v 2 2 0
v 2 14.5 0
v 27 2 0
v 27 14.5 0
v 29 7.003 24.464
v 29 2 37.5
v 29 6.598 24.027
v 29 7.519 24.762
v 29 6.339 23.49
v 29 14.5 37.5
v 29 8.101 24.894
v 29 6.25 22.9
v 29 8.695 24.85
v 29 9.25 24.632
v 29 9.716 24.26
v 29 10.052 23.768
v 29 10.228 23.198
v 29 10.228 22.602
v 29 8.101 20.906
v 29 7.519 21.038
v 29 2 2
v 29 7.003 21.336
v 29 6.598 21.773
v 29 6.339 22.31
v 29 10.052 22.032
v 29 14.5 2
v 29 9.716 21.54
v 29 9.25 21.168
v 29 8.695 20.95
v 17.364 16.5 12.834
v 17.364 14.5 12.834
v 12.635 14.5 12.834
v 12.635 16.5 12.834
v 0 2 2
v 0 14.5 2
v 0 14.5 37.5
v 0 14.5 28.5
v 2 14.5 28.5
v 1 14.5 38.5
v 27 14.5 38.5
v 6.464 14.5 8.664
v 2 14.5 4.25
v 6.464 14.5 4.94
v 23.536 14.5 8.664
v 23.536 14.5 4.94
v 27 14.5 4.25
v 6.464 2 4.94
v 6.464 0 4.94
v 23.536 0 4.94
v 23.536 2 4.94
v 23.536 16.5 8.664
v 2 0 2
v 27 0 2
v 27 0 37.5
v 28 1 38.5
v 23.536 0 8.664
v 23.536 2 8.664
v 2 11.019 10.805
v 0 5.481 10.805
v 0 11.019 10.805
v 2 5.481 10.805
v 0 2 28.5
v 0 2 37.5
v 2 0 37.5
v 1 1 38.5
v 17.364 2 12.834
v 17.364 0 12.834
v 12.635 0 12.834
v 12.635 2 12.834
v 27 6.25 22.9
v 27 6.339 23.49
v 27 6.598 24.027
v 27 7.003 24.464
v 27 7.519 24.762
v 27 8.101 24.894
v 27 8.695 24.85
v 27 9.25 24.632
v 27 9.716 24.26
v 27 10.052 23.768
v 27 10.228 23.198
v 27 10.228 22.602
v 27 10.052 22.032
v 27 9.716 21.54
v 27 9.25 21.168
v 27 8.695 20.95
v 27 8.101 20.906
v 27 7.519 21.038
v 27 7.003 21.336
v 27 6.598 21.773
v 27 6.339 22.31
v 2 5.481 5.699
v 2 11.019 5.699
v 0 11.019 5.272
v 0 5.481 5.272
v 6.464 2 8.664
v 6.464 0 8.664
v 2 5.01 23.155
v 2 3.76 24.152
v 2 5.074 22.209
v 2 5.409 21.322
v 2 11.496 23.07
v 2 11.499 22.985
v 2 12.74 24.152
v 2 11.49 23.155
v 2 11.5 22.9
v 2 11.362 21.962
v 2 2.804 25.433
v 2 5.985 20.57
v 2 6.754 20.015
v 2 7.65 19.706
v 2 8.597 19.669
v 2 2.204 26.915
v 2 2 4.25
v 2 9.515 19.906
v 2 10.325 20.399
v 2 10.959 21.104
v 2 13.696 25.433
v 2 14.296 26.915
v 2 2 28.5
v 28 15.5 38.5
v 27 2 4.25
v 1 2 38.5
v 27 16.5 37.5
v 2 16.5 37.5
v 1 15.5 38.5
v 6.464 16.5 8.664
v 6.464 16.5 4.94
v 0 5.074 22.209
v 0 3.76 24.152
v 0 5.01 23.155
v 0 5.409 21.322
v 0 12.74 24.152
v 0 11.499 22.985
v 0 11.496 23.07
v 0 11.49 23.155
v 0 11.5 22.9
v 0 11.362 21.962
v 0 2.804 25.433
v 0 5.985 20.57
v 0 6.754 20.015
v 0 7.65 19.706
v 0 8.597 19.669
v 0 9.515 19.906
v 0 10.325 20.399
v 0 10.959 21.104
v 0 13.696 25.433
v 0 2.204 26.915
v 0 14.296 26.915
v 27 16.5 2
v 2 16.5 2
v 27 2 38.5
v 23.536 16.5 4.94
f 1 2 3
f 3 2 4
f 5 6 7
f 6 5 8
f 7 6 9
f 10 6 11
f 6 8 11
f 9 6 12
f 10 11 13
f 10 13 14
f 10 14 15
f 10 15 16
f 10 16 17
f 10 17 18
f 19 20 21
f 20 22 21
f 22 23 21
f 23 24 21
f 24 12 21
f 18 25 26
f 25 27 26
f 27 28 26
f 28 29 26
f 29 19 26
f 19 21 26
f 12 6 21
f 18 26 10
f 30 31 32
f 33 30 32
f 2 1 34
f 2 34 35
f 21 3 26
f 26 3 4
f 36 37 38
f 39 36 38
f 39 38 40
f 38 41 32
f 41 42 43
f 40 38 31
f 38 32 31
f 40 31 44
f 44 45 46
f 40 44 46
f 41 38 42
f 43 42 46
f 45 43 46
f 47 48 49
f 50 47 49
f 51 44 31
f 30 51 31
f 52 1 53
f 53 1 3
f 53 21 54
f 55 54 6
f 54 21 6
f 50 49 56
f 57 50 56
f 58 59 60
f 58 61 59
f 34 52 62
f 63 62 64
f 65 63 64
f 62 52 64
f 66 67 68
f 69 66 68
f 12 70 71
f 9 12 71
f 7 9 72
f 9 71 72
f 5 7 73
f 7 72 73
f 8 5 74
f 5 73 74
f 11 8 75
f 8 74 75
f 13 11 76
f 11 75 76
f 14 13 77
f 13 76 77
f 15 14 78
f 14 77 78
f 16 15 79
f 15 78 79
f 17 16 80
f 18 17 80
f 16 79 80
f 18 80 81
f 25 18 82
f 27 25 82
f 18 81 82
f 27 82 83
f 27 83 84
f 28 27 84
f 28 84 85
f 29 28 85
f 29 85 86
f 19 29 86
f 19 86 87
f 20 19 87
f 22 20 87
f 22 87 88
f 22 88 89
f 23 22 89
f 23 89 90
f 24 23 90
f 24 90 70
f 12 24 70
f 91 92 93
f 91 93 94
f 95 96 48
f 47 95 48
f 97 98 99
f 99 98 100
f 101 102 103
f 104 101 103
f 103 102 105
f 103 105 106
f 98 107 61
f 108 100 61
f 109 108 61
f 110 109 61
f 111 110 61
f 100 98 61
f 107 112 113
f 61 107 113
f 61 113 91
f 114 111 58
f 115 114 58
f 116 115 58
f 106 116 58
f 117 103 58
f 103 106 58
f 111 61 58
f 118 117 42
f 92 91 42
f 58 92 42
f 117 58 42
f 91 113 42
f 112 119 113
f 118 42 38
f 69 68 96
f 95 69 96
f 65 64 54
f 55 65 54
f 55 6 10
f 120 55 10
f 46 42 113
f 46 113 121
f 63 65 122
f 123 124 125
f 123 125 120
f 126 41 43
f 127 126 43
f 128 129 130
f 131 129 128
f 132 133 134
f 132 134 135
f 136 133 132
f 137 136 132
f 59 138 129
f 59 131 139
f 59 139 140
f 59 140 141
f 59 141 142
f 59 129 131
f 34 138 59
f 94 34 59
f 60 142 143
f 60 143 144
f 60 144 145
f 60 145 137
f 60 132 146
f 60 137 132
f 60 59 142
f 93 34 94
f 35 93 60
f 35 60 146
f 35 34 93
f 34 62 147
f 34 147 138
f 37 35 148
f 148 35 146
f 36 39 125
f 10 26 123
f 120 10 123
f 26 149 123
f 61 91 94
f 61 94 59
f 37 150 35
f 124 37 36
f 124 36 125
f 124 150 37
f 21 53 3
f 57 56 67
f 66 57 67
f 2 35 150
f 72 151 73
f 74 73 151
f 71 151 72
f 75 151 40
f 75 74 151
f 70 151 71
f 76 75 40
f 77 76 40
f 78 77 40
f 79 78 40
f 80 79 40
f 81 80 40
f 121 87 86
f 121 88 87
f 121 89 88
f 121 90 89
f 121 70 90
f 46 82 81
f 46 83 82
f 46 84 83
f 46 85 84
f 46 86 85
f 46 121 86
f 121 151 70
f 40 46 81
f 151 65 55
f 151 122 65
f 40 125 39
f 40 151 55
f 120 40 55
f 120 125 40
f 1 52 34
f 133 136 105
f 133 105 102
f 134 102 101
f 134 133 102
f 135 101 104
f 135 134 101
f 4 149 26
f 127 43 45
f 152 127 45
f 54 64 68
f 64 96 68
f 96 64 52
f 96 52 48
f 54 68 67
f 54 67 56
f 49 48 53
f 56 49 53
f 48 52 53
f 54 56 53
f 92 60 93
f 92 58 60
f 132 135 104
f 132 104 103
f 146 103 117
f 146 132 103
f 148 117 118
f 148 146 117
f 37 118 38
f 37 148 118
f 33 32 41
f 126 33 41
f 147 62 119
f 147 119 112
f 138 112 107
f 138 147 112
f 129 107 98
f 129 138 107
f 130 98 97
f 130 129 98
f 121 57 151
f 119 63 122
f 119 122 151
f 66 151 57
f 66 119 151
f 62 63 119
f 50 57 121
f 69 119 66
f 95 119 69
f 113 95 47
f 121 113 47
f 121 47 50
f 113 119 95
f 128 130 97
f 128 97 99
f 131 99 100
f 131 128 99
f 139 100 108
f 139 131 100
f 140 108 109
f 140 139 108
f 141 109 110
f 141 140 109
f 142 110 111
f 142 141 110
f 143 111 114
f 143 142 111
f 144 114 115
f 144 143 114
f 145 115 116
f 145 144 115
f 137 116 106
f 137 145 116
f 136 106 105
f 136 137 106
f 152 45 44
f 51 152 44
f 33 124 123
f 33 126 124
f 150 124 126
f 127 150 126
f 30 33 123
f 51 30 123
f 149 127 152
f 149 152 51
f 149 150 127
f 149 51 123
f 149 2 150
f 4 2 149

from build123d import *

# Parameters (mm, degrees)
F0_W      = 29
F0_H      = 16.5
F1_DEPTH  = 38.5
F2_T      = -2
F3_DEPTH  = 2.25
F4_SIZE   = 2
F5_SIZE   = 0.99999
F7_DEPTH  = 16.501
F9_DEPTH  = 2
F10_R     = 2
F11_DEPTH = 2.001
F12_W     = 5.538
F12_H     = 5.533
F14_W     = 5.538
F14_H     = 4.583


# Not quite as in the source:
# - a fillet or chamfer is up to 0.001 mm smaller than in the source, because OpenCascade refuses the exact size


with BuildPart() as f1:
    # F0 (on Top) → F1 (new body)
    with BuildSketch(Plane.XY):
        with Locations((14.5, 8.25)):
            Rectangle(F0_W, F0_H)
    extrude(amount=F1_DEPTH)

    # F2
    f2_openings = [f1.faces().sort_by_distance(p)[0] for p in [
        (14.5, 8.25, 38.5),
    ]]
    offset(amount=F2_T, openings=f2_openings)

    # F3 (add): a face of the model
    f3_faces = [f1.faces().sort_by_distance(p)[0] for p in [
        (14.5, 8.25, 2),
    ]]
    extrude(f3_faces, amount=F3_DEPTH)

    # F4
    f4_edges = [f1.edges().sort_by_distance(p)[0] for p in [
        (29, 0, 19.25),
        (29, 16.5, 19.25),
        (0, 0, 19.25),
        (0, 16.5, 19.25),
        (14.5, 0, 0),
        (0, 8.25, 0),
        (14.5, 16.5, 0),
        (29, 8.25, 0),
    ]]
    chamfer(f4_edges, length=F4_SIZE)

    # F5 (size 1 in the source; OpenCascade refuses exactly that, so slightly less here)
    f5_edges = [f1.edges().sort_by_distance(p)[0] for p in [
        (14.5, 0, 38.5),
        (29, 8.25, 38.5),
        (14.5, 16.5, 38.5),
        (0, 8.25, 38.5),
    ]]
    chamfer(f5_edges, length=F5_SIZE)

    # F6 (on face) → F7 (cut, through all)
    with BuildSketch(Plane.XZ):
        Polygon((6.464, 8.664), (6.464, 4.94), (23.536, 4.94), (23.536, 8.664), (17.364, 12.834), (12.635, 12.834), align=None)
    extrude(amount=-F7_DEPTH, mode=Mode.SUBTRACT)

    # F8 (on Right) → F9 (cut, through all)
    with BuildSketch(Plane.YZ):
        with BuildLine():
            Line((14.5, 38.5), (2, 38.5))
            Line((2, 38.5), (2, 28.5))
            ThreePointArc((2, 28.5), (8.25, 34.75), (14.5, 28.5))
            Line((14.5, 28.5), (14.5, 38.5))
        make_face()
        with BuildLine():
            ThreePointArc((14.5, 28.5), (8.25, 34.75), (2, 28.5))
            Line((2, 28.5), (14.5, 28.5))
        make_face()
        with BuildLine():
            Line((14.5, 28.5), (2, 28.5))
            ThreePointArc((2, 28.5), (2.8042583777, 25.4330148055), (5.0100474186, 23.1553571429))
            ThreePointArc((5.0100474186, 23.1553571429), (8.25, 26.15), (11.4899525814, 23.1553571429))
            ThreePointArc((11.4899525814, 23.1553571429), (13.6957416223, 25.4330148055), (14.5, 28.5))
        make_face()
        with BuildLine():
            ThreePointArc((11.4899525814, 23.1553571429), (8.25, 26.15), (5.0100474186, 23.1553571429))
            ThreePointArc((5.0100474186, 23.1553571429), (8.25, 22.25), (11.4899525814, 23.1553571429))
        make_face()
        with BuildLine():
            ThreePointArc((11.4899525814, 23.1553571429), (8.25, 22.25), (5.0100474186, 23.1553571429))
            ThreePointArc((5.0100474186, 23.1553571429), (8.122222634, 19.6525128261), (11.5, 22.9))
            ThreePointArc((11.5, 22.9), (11.4974871739, 23.027777366), (11.4899525814, 23.1553571429))
        make_face()
    extrude(amount=F9_DEPTH, mode=Mode.SUBTRACT)

    # F10 (on face) → F11 (cut, through all)
    with BuildSketch(Plane(origin=(27, 0, 0), x_dir=(0, -1, 0), z_dir=(-1, 0, 0))):
        with Locations((-8.25, 22.9)):
            Circle(F10_R)
    extrude(amount=-F11_DEPTH, mode=Mode.SUBTRACT)

    # F12 (on face) → F15 section 0
    with BuildSketch(Plane(origin=(0, 0, 0), x_dir=(0, -1, 0), z_dir=(-1, 0, 0))):
        with Locations((-8.25, 8.0385)):
            Rectangle(F12_W, F12_H)
    # F14 (on offset) → F15 section 1
    with BuildSketch(Plane(origin=(4.45, 0, 0), x_dir=(0, -1, 0), z_dir=(-1, 0, 0))):
        with Locations((-8.25, 8.5135)):
            Rectangle(F14_W, F14_H)
    loft(mode=Mode.SUBTRACT)


solid = f1.part
